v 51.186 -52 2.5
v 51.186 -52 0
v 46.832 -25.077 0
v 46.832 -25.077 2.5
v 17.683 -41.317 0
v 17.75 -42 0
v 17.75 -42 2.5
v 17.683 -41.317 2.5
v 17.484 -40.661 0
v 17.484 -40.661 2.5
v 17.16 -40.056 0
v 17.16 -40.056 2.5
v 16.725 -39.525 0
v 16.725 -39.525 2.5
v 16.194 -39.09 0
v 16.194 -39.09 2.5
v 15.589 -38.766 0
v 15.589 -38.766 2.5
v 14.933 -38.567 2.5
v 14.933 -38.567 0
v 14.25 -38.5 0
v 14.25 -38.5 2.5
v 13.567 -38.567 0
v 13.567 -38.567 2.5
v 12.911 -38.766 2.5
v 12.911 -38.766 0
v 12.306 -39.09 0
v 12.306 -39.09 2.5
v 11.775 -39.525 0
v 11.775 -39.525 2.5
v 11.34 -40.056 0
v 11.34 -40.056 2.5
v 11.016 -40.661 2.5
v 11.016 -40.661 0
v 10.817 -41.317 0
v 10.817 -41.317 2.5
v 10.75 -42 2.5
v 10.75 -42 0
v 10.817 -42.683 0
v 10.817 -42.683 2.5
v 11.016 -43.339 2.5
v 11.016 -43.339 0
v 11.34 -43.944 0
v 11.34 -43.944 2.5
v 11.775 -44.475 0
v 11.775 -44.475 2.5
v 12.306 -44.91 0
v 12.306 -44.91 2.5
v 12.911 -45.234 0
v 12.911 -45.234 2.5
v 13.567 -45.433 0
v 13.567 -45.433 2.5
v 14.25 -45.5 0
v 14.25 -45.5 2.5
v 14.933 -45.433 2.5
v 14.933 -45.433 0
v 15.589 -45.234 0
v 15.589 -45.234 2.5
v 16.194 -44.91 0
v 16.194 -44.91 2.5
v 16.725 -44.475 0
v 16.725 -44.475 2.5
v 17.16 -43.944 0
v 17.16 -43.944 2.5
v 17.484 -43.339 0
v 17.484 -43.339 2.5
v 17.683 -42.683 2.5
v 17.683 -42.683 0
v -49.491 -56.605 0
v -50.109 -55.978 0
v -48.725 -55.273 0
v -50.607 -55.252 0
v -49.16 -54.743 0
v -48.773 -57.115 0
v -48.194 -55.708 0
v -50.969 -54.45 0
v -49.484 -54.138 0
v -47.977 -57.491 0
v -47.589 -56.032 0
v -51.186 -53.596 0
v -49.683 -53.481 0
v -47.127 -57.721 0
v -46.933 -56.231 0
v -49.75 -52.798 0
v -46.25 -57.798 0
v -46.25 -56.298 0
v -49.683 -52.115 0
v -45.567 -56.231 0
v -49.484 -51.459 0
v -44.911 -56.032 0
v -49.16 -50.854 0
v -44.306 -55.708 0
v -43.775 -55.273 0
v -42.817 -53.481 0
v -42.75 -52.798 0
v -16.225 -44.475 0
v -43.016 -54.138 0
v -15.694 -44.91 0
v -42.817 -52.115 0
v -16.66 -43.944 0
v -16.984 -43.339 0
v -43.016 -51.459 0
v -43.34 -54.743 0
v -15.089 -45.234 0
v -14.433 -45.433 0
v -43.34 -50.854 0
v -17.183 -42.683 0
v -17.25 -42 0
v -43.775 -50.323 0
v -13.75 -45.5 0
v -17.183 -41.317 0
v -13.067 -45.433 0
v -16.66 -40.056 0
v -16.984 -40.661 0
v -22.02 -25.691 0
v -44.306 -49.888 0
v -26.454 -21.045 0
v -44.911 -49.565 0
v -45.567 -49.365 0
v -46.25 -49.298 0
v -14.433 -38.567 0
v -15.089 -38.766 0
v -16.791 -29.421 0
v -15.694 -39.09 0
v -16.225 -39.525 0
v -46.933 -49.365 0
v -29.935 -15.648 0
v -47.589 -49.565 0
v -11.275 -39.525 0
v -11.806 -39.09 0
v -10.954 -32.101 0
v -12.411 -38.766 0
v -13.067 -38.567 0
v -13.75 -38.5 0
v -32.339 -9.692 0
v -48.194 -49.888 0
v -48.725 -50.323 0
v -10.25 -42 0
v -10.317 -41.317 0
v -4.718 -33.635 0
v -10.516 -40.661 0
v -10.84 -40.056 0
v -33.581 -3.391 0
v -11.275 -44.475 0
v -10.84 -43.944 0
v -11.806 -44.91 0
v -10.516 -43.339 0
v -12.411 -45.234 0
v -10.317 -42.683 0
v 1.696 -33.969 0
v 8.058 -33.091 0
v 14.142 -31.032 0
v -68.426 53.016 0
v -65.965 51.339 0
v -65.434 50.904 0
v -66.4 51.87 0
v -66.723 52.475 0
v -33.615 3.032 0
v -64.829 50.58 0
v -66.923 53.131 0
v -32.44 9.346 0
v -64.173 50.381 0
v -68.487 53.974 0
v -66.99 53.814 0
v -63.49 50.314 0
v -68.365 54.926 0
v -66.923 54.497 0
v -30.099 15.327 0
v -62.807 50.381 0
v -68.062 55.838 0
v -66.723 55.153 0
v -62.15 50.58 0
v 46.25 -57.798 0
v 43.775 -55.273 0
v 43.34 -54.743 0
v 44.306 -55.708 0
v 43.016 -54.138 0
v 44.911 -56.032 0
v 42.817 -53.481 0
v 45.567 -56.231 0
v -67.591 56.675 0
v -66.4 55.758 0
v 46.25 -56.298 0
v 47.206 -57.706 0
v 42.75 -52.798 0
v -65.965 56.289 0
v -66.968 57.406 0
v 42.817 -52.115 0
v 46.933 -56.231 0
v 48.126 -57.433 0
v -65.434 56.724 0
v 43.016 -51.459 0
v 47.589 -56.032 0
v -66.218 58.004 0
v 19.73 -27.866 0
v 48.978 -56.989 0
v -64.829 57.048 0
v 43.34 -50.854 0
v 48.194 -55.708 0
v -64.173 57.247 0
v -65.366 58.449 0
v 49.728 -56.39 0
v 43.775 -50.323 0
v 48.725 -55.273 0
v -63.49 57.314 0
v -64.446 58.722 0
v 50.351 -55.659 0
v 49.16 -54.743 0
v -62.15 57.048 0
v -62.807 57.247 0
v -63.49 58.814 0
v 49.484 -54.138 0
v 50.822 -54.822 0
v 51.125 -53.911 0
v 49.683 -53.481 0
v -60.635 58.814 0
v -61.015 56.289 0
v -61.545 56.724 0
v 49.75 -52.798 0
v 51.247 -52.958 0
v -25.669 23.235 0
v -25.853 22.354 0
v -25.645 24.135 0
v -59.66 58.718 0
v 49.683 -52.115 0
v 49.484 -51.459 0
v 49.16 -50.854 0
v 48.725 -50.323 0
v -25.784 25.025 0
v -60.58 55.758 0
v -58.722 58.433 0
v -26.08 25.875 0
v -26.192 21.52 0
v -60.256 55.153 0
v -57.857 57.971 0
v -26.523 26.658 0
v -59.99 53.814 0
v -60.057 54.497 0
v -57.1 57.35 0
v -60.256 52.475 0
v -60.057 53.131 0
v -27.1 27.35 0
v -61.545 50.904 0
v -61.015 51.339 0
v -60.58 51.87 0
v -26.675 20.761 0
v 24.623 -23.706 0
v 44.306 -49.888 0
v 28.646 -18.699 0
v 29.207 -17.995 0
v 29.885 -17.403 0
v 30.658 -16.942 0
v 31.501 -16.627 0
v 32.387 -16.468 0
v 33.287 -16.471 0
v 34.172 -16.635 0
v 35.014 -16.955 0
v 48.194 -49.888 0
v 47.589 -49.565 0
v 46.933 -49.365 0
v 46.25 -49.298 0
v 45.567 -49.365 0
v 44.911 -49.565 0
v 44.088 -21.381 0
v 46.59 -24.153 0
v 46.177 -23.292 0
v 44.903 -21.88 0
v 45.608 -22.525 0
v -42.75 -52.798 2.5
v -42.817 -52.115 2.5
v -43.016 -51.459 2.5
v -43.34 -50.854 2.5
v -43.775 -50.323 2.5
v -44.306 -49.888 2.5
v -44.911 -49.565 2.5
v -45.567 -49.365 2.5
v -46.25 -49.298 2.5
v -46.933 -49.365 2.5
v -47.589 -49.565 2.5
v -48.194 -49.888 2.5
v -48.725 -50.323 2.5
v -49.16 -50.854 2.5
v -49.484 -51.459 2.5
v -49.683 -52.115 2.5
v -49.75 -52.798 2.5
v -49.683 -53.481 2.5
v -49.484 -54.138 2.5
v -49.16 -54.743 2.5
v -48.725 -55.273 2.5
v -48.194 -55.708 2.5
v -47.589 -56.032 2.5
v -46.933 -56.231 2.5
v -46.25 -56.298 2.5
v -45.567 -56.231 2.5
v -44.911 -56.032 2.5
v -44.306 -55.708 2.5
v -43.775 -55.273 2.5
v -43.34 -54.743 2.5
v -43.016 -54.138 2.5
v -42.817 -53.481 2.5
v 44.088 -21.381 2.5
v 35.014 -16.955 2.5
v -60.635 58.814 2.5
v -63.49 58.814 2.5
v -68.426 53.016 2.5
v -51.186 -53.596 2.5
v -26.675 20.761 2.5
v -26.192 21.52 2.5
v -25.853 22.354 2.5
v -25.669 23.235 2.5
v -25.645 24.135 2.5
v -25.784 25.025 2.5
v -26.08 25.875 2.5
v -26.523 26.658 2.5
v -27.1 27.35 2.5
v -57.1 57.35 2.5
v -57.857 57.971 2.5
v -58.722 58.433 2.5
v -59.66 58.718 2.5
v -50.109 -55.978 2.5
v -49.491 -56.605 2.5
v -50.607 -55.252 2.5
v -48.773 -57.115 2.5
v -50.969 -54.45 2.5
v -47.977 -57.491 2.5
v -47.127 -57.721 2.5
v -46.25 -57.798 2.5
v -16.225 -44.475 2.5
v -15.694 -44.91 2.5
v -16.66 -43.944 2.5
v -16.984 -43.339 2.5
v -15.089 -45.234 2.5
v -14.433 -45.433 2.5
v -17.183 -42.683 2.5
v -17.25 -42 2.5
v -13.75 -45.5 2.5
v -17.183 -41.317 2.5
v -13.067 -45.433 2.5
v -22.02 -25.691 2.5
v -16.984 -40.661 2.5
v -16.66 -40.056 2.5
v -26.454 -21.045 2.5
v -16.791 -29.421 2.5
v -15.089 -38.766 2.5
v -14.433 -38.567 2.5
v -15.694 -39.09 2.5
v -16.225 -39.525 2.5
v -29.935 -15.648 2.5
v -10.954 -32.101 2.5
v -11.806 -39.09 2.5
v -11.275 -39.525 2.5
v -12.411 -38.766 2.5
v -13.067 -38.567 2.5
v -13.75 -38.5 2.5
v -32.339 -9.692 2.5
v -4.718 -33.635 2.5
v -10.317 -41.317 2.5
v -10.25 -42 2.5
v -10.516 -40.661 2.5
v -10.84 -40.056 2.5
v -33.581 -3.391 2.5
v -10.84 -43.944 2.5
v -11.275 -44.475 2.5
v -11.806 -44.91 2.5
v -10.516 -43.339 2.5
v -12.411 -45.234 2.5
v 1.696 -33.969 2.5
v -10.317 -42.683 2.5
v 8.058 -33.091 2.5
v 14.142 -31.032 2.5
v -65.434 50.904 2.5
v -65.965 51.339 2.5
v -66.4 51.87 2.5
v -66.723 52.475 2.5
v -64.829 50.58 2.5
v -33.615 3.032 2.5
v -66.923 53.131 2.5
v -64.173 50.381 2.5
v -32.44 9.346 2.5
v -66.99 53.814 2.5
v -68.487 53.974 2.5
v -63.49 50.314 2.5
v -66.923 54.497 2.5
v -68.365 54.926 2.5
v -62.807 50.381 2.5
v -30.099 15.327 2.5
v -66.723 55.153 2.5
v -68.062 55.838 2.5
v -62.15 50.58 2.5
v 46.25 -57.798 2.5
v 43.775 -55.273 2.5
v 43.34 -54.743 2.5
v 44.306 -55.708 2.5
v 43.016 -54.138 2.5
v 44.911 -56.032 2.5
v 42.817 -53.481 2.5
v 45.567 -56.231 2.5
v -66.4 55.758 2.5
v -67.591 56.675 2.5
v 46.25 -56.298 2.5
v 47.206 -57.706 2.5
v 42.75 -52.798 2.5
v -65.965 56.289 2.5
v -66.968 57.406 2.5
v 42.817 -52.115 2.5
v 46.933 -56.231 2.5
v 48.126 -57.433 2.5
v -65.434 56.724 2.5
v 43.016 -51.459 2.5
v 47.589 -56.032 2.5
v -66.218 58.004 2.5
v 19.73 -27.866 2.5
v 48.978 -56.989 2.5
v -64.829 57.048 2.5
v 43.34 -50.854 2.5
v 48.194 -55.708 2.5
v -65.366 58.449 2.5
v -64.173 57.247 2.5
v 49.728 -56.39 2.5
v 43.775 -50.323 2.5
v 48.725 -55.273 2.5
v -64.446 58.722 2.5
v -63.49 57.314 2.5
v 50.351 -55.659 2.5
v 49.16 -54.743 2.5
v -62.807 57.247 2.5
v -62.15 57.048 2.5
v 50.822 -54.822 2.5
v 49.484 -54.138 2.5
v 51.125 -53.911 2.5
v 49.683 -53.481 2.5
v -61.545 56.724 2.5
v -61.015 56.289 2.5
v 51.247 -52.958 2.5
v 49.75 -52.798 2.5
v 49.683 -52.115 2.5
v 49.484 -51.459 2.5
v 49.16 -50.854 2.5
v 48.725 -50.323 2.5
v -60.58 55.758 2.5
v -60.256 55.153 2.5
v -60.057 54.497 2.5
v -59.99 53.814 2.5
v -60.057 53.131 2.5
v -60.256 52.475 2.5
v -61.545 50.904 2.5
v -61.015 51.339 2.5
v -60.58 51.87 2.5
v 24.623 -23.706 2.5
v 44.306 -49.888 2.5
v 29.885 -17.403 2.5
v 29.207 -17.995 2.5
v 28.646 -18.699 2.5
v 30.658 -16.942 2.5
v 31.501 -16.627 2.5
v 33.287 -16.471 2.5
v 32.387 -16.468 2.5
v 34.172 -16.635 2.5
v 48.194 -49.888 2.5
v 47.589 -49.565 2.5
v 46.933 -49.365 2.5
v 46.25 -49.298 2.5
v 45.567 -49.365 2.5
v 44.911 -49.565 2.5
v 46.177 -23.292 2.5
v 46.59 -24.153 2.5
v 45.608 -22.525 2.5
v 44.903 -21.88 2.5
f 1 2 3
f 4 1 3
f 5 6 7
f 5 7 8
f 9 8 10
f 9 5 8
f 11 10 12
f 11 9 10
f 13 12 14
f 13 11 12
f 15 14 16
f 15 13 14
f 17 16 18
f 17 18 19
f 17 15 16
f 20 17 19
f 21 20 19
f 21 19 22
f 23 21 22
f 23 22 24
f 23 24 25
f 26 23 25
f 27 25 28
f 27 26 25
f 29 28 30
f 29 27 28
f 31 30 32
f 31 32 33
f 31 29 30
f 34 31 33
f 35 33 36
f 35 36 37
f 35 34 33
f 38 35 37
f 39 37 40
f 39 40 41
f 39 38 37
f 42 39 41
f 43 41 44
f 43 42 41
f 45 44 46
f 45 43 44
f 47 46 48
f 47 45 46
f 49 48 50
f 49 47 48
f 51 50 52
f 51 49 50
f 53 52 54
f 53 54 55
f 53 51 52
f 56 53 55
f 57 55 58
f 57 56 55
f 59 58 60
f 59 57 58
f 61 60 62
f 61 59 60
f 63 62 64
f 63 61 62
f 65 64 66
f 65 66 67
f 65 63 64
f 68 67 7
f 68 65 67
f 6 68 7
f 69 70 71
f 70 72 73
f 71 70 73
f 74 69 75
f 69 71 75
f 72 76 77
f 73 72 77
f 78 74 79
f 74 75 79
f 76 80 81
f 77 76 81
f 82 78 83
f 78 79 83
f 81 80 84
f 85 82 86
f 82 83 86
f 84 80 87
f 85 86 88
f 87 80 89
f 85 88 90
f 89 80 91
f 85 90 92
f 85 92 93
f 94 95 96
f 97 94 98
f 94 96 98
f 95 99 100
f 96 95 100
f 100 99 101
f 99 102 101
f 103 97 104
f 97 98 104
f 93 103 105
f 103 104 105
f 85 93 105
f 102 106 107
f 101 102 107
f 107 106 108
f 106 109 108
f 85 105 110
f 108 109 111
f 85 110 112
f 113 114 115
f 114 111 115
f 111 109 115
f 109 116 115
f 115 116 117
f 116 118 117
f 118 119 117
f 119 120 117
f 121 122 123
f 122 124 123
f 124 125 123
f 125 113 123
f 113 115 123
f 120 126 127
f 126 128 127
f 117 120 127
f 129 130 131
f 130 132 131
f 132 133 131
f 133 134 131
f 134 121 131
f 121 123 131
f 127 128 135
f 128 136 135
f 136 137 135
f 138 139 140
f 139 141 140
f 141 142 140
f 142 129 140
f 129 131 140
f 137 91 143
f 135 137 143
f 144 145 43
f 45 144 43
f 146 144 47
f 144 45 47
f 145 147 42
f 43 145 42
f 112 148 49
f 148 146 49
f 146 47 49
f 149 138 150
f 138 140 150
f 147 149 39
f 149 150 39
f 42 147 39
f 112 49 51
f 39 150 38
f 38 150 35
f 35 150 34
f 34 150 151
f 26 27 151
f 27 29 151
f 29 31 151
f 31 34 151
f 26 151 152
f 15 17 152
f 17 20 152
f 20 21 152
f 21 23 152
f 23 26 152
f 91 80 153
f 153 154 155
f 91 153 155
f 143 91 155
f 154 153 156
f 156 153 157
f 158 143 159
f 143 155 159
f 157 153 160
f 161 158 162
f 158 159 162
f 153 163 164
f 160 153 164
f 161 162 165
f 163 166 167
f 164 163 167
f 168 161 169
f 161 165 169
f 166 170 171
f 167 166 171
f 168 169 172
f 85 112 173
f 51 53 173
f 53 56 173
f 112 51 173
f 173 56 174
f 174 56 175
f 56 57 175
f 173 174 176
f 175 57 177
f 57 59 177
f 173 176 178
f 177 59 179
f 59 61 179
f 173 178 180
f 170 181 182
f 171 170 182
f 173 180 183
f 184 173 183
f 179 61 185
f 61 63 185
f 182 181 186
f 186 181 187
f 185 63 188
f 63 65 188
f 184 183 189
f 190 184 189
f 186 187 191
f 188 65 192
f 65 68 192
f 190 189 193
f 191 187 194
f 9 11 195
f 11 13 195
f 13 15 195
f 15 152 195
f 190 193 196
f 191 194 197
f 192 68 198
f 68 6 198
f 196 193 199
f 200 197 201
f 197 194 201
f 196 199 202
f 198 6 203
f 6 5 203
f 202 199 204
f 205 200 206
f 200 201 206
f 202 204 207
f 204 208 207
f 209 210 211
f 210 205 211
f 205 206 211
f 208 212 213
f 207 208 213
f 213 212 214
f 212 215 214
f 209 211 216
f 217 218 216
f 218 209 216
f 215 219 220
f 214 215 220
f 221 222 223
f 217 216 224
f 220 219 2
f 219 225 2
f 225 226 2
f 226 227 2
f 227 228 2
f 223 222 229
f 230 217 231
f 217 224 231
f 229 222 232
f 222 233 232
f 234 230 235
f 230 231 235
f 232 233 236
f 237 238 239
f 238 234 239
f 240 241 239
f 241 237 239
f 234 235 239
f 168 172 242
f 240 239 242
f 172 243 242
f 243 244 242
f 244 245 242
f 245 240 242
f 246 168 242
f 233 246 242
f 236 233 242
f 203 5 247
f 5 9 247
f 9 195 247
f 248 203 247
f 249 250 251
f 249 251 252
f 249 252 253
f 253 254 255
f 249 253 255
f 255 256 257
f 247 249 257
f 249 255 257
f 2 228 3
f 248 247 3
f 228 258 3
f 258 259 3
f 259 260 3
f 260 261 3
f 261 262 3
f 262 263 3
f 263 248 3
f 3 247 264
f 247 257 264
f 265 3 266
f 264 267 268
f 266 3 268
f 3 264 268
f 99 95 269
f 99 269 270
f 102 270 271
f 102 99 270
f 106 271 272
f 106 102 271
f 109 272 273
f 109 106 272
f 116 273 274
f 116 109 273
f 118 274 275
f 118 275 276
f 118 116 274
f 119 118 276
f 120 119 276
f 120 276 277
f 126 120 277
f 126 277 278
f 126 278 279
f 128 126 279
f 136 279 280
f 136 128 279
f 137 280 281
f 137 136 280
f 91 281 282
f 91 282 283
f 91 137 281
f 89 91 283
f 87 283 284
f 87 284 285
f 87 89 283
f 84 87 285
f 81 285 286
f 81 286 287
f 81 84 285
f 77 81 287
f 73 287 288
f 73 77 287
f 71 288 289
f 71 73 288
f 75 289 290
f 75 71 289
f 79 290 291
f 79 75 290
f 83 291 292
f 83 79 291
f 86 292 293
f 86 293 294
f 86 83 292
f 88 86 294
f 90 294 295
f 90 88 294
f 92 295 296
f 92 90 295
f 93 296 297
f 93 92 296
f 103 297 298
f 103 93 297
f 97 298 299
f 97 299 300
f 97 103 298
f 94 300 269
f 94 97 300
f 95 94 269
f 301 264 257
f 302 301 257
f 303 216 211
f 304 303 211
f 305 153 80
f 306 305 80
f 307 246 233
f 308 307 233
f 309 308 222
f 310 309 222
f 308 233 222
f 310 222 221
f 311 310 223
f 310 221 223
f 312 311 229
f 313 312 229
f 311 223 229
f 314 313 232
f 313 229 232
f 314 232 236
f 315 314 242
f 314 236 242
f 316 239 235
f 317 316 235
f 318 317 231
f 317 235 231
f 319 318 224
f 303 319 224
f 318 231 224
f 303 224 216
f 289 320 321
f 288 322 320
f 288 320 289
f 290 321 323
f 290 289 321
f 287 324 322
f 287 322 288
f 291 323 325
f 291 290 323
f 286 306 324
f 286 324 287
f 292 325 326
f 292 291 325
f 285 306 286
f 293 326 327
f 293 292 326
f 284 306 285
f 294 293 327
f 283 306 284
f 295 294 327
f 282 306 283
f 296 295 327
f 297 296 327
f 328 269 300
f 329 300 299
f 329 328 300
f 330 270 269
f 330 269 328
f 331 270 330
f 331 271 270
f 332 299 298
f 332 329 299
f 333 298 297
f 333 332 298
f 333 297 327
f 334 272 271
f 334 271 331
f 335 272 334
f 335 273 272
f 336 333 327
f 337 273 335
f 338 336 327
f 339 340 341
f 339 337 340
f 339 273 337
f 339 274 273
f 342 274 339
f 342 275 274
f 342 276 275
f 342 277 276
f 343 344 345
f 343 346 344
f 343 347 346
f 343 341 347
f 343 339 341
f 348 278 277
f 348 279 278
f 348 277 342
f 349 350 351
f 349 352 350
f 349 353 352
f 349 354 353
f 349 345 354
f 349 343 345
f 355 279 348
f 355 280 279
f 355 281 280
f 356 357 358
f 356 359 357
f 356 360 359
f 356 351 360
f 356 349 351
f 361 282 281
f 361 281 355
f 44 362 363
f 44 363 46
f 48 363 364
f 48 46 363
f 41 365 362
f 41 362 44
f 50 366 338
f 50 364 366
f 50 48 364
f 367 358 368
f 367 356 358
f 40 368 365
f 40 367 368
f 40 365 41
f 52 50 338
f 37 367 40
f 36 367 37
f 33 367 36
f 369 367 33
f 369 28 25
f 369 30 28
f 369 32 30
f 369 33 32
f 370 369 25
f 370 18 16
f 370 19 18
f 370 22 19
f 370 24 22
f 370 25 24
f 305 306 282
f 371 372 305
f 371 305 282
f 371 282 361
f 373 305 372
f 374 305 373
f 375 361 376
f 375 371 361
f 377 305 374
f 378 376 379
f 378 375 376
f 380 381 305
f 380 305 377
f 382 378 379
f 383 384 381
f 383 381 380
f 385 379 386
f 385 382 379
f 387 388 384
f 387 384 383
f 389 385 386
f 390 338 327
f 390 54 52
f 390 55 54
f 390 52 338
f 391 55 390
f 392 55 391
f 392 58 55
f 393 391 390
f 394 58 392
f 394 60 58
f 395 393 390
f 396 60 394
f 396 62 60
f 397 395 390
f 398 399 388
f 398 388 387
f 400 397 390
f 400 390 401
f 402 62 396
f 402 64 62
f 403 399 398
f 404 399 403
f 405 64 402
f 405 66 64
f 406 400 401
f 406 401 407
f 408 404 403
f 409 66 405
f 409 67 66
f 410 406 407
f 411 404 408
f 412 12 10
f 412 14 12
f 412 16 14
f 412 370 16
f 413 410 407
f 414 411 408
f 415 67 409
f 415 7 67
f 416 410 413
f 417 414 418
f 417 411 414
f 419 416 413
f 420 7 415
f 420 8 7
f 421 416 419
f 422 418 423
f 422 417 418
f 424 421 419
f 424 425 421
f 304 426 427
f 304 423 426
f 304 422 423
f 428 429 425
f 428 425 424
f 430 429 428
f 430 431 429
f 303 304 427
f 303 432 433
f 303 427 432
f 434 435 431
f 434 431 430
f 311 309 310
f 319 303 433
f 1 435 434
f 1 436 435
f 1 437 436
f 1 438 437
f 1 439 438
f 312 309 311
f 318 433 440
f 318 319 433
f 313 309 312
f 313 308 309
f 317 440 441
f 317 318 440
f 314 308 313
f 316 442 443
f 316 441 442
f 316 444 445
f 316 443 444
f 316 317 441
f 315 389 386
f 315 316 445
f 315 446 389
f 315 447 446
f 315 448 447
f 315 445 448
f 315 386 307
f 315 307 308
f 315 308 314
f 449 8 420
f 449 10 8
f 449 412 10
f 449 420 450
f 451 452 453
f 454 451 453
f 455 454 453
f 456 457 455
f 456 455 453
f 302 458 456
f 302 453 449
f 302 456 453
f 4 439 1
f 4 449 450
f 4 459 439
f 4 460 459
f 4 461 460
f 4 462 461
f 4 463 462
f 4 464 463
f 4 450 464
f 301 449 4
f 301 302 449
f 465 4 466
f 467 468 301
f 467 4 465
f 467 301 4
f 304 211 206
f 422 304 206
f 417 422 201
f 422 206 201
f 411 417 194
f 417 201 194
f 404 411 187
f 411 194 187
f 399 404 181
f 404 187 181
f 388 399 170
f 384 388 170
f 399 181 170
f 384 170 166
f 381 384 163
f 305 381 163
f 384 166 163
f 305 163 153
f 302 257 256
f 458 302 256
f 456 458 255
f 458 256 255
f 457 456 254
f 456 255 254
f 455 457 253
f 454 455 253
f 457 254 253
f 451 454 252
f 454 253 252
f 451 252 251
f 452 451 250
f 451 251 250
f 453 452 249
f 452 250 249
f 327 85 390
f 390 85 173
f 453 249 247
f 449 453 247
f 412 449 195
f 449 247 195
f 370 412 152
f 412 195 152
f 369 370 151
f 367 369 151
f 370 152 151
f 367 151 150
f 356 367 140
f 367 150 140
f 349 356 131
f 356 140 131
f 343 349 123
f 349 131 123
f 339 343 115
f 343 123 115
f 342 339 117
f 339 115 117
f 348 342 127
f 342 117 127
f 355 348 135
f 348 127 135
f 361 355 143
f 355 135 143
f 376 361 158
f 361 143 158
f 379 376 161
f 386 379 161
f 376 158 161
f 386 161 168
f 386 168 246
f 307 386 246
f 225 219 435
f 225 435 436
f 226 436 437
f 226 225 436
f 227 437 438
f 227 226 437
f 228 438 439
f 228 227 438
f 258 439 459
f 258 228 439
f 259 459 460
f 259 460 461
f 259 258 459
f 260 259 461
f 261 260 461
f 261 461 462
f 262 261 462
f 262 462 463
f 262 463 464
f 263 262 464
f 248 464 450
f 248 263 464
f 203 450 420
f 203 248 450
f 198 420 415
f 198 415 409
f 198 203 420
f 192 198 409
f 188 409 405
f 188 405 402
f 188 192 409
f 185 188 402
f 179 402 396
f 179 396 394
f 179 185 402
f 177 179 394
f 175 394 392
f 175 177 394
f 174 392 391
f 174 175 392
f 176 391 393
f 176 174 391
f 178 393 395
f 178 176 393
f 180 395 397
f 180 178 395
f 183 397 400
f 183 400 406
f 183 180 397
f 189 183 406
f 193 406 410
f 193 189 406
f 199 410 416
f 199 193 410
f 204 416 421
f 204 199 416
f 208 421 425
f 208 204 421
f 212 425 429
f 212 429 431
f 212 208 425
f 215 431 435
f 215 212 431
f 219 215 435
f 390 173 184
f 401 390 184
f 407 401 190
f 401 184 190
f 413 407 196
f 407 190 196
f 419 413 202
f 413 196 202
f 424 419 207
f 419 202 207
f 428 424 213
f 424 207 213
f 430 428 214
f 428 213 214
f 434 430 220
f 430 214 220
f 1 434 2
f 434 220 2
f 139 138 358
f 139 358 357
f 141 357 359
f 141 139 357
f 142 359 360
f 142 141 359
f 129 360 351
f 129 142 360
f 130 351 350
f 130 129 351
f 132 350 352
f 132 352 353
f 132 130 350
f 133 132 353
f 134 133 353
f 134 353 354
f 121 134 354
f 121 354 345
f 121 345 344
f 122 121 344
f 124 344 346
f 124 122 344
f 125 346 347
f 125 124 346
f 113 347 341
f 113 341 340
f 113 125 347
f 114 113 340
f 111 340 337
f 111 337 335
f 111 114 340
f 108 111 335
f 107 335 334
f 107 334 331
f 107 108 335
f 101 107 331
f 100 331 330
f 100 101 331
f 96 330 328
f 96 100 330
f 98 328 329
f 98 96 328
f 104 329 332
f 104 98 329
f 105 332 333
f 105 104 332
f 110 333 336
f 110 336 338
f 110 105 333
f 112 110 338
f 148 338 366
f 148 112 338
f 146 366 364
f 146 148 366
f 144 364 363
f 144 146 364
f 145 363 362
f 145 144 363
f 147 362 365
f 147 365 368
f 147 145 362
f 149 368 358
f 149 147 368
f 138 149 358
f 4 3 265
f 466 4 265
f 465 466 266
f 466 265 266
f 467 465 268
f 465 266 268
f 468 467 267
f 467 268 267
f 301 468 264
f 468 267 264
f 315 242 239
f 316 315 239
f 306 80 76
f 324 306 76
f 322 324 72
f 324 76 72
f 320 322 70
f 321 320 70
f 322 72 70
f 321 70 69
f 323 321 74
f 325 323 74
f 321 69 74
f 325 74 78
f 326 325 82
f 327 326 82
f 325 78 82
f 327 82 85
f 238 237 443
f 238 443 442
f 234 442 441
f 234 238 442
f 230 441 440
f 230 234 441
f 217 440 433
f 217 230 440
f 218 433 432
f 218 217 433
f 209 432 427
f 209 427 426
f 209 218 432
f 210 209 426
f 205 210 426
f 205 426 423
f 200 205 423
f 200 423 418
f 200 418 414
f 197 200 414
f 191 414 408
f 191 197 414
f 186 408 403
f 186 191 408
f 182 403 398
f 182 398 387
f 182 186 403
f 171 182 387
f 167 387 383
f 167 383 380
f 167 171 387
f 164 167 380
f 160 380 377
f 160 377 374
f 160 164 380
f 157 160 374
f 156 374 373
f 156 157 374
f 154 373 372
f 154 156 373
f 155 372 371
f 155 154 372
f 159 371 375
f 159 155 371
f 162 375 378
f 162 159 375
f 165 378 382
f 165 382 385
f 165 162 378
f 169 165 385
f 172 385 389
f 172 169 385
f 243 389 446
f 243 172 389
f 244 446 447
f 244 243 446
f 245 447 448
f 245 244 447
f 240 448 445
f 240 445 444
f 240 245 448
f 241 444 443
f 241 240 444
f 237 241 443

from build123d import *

# Parameters (mm, degrees)
F0_R     = 3.5
F1_DEPTH = 2.5


with BuildPart() as f1:
    # F0 (on Top) → F1 (new body)
    with BuildSketch(Plane.XY):
        with BuildLine():
            Line((-60.635068, 58.814), (-63.489865, 58.814))
            ThreePointArc((-63.489865, 58.814), (-67.297148, 57.055079), (-68.425747, 53.015837))
            Line((-68.425747, 53.015837), (-51.185882, -53.596367))
            ThreePointArc((-51.185882, -53.596367), (-49.491079, -56.605488), (-46.25, -57.798204))
            Line((-46.25, -57.798204), (46.25, -57.798204))
            ThreePointArc((46.25, -57.798204), (50.057284, -56.039283), (51.185882, -52.000041))
            Line((51.185882, -52.000041), (46.832282, -25.077153))
            ThreePointArc((46.832282, -25.077153), (45.910862, -22.894697), (44.088255, -21.381346))
            Line((44.088255, -21.381346), (35.013699, -16.955389))
            ThreePointArc((35.013699, -16.955389), (31.501043, -16.626965), (28.645966, -18.699441))
            ThreePointArc((28.645966, -18.699441), (-19.4939, -27.679928), (-26.675491, 20.760971))
            ThreePointArc((-26.675491, 20.760971), (-25.645449, 24.135231), (-27.099589, 27.349589))
            Line((-27.099589, 27.349589), (-57.099534, 57.349534))
            ThreePointArc((-57.099534, 57.349534), (-58.721651, 58.433398), (-60.635068, 58.814))
        make_face()
        with Locations((-46.25, -52.798204)):
            Circle(F0_R, mode=Mode.SUBTRACT)
        with Locations((-13.75, -42)):
            Circle(F0_R, mode=Mode.SUBTRACT)
        with Locations((14.25, -42)):
            Circle(F0_R, mode=Mode.SUBTRACT)
        with Locations((46.25, -52.798204)):
            Circle(F0_R, mode=Mode.SUBTRACT)
        with Locations((-63.489865, 53.814)):
            Circle(F0_R, mode=Mode.SUBTRACT)
    extrude(amount=F1_DEPTH)


solid = f1.part
